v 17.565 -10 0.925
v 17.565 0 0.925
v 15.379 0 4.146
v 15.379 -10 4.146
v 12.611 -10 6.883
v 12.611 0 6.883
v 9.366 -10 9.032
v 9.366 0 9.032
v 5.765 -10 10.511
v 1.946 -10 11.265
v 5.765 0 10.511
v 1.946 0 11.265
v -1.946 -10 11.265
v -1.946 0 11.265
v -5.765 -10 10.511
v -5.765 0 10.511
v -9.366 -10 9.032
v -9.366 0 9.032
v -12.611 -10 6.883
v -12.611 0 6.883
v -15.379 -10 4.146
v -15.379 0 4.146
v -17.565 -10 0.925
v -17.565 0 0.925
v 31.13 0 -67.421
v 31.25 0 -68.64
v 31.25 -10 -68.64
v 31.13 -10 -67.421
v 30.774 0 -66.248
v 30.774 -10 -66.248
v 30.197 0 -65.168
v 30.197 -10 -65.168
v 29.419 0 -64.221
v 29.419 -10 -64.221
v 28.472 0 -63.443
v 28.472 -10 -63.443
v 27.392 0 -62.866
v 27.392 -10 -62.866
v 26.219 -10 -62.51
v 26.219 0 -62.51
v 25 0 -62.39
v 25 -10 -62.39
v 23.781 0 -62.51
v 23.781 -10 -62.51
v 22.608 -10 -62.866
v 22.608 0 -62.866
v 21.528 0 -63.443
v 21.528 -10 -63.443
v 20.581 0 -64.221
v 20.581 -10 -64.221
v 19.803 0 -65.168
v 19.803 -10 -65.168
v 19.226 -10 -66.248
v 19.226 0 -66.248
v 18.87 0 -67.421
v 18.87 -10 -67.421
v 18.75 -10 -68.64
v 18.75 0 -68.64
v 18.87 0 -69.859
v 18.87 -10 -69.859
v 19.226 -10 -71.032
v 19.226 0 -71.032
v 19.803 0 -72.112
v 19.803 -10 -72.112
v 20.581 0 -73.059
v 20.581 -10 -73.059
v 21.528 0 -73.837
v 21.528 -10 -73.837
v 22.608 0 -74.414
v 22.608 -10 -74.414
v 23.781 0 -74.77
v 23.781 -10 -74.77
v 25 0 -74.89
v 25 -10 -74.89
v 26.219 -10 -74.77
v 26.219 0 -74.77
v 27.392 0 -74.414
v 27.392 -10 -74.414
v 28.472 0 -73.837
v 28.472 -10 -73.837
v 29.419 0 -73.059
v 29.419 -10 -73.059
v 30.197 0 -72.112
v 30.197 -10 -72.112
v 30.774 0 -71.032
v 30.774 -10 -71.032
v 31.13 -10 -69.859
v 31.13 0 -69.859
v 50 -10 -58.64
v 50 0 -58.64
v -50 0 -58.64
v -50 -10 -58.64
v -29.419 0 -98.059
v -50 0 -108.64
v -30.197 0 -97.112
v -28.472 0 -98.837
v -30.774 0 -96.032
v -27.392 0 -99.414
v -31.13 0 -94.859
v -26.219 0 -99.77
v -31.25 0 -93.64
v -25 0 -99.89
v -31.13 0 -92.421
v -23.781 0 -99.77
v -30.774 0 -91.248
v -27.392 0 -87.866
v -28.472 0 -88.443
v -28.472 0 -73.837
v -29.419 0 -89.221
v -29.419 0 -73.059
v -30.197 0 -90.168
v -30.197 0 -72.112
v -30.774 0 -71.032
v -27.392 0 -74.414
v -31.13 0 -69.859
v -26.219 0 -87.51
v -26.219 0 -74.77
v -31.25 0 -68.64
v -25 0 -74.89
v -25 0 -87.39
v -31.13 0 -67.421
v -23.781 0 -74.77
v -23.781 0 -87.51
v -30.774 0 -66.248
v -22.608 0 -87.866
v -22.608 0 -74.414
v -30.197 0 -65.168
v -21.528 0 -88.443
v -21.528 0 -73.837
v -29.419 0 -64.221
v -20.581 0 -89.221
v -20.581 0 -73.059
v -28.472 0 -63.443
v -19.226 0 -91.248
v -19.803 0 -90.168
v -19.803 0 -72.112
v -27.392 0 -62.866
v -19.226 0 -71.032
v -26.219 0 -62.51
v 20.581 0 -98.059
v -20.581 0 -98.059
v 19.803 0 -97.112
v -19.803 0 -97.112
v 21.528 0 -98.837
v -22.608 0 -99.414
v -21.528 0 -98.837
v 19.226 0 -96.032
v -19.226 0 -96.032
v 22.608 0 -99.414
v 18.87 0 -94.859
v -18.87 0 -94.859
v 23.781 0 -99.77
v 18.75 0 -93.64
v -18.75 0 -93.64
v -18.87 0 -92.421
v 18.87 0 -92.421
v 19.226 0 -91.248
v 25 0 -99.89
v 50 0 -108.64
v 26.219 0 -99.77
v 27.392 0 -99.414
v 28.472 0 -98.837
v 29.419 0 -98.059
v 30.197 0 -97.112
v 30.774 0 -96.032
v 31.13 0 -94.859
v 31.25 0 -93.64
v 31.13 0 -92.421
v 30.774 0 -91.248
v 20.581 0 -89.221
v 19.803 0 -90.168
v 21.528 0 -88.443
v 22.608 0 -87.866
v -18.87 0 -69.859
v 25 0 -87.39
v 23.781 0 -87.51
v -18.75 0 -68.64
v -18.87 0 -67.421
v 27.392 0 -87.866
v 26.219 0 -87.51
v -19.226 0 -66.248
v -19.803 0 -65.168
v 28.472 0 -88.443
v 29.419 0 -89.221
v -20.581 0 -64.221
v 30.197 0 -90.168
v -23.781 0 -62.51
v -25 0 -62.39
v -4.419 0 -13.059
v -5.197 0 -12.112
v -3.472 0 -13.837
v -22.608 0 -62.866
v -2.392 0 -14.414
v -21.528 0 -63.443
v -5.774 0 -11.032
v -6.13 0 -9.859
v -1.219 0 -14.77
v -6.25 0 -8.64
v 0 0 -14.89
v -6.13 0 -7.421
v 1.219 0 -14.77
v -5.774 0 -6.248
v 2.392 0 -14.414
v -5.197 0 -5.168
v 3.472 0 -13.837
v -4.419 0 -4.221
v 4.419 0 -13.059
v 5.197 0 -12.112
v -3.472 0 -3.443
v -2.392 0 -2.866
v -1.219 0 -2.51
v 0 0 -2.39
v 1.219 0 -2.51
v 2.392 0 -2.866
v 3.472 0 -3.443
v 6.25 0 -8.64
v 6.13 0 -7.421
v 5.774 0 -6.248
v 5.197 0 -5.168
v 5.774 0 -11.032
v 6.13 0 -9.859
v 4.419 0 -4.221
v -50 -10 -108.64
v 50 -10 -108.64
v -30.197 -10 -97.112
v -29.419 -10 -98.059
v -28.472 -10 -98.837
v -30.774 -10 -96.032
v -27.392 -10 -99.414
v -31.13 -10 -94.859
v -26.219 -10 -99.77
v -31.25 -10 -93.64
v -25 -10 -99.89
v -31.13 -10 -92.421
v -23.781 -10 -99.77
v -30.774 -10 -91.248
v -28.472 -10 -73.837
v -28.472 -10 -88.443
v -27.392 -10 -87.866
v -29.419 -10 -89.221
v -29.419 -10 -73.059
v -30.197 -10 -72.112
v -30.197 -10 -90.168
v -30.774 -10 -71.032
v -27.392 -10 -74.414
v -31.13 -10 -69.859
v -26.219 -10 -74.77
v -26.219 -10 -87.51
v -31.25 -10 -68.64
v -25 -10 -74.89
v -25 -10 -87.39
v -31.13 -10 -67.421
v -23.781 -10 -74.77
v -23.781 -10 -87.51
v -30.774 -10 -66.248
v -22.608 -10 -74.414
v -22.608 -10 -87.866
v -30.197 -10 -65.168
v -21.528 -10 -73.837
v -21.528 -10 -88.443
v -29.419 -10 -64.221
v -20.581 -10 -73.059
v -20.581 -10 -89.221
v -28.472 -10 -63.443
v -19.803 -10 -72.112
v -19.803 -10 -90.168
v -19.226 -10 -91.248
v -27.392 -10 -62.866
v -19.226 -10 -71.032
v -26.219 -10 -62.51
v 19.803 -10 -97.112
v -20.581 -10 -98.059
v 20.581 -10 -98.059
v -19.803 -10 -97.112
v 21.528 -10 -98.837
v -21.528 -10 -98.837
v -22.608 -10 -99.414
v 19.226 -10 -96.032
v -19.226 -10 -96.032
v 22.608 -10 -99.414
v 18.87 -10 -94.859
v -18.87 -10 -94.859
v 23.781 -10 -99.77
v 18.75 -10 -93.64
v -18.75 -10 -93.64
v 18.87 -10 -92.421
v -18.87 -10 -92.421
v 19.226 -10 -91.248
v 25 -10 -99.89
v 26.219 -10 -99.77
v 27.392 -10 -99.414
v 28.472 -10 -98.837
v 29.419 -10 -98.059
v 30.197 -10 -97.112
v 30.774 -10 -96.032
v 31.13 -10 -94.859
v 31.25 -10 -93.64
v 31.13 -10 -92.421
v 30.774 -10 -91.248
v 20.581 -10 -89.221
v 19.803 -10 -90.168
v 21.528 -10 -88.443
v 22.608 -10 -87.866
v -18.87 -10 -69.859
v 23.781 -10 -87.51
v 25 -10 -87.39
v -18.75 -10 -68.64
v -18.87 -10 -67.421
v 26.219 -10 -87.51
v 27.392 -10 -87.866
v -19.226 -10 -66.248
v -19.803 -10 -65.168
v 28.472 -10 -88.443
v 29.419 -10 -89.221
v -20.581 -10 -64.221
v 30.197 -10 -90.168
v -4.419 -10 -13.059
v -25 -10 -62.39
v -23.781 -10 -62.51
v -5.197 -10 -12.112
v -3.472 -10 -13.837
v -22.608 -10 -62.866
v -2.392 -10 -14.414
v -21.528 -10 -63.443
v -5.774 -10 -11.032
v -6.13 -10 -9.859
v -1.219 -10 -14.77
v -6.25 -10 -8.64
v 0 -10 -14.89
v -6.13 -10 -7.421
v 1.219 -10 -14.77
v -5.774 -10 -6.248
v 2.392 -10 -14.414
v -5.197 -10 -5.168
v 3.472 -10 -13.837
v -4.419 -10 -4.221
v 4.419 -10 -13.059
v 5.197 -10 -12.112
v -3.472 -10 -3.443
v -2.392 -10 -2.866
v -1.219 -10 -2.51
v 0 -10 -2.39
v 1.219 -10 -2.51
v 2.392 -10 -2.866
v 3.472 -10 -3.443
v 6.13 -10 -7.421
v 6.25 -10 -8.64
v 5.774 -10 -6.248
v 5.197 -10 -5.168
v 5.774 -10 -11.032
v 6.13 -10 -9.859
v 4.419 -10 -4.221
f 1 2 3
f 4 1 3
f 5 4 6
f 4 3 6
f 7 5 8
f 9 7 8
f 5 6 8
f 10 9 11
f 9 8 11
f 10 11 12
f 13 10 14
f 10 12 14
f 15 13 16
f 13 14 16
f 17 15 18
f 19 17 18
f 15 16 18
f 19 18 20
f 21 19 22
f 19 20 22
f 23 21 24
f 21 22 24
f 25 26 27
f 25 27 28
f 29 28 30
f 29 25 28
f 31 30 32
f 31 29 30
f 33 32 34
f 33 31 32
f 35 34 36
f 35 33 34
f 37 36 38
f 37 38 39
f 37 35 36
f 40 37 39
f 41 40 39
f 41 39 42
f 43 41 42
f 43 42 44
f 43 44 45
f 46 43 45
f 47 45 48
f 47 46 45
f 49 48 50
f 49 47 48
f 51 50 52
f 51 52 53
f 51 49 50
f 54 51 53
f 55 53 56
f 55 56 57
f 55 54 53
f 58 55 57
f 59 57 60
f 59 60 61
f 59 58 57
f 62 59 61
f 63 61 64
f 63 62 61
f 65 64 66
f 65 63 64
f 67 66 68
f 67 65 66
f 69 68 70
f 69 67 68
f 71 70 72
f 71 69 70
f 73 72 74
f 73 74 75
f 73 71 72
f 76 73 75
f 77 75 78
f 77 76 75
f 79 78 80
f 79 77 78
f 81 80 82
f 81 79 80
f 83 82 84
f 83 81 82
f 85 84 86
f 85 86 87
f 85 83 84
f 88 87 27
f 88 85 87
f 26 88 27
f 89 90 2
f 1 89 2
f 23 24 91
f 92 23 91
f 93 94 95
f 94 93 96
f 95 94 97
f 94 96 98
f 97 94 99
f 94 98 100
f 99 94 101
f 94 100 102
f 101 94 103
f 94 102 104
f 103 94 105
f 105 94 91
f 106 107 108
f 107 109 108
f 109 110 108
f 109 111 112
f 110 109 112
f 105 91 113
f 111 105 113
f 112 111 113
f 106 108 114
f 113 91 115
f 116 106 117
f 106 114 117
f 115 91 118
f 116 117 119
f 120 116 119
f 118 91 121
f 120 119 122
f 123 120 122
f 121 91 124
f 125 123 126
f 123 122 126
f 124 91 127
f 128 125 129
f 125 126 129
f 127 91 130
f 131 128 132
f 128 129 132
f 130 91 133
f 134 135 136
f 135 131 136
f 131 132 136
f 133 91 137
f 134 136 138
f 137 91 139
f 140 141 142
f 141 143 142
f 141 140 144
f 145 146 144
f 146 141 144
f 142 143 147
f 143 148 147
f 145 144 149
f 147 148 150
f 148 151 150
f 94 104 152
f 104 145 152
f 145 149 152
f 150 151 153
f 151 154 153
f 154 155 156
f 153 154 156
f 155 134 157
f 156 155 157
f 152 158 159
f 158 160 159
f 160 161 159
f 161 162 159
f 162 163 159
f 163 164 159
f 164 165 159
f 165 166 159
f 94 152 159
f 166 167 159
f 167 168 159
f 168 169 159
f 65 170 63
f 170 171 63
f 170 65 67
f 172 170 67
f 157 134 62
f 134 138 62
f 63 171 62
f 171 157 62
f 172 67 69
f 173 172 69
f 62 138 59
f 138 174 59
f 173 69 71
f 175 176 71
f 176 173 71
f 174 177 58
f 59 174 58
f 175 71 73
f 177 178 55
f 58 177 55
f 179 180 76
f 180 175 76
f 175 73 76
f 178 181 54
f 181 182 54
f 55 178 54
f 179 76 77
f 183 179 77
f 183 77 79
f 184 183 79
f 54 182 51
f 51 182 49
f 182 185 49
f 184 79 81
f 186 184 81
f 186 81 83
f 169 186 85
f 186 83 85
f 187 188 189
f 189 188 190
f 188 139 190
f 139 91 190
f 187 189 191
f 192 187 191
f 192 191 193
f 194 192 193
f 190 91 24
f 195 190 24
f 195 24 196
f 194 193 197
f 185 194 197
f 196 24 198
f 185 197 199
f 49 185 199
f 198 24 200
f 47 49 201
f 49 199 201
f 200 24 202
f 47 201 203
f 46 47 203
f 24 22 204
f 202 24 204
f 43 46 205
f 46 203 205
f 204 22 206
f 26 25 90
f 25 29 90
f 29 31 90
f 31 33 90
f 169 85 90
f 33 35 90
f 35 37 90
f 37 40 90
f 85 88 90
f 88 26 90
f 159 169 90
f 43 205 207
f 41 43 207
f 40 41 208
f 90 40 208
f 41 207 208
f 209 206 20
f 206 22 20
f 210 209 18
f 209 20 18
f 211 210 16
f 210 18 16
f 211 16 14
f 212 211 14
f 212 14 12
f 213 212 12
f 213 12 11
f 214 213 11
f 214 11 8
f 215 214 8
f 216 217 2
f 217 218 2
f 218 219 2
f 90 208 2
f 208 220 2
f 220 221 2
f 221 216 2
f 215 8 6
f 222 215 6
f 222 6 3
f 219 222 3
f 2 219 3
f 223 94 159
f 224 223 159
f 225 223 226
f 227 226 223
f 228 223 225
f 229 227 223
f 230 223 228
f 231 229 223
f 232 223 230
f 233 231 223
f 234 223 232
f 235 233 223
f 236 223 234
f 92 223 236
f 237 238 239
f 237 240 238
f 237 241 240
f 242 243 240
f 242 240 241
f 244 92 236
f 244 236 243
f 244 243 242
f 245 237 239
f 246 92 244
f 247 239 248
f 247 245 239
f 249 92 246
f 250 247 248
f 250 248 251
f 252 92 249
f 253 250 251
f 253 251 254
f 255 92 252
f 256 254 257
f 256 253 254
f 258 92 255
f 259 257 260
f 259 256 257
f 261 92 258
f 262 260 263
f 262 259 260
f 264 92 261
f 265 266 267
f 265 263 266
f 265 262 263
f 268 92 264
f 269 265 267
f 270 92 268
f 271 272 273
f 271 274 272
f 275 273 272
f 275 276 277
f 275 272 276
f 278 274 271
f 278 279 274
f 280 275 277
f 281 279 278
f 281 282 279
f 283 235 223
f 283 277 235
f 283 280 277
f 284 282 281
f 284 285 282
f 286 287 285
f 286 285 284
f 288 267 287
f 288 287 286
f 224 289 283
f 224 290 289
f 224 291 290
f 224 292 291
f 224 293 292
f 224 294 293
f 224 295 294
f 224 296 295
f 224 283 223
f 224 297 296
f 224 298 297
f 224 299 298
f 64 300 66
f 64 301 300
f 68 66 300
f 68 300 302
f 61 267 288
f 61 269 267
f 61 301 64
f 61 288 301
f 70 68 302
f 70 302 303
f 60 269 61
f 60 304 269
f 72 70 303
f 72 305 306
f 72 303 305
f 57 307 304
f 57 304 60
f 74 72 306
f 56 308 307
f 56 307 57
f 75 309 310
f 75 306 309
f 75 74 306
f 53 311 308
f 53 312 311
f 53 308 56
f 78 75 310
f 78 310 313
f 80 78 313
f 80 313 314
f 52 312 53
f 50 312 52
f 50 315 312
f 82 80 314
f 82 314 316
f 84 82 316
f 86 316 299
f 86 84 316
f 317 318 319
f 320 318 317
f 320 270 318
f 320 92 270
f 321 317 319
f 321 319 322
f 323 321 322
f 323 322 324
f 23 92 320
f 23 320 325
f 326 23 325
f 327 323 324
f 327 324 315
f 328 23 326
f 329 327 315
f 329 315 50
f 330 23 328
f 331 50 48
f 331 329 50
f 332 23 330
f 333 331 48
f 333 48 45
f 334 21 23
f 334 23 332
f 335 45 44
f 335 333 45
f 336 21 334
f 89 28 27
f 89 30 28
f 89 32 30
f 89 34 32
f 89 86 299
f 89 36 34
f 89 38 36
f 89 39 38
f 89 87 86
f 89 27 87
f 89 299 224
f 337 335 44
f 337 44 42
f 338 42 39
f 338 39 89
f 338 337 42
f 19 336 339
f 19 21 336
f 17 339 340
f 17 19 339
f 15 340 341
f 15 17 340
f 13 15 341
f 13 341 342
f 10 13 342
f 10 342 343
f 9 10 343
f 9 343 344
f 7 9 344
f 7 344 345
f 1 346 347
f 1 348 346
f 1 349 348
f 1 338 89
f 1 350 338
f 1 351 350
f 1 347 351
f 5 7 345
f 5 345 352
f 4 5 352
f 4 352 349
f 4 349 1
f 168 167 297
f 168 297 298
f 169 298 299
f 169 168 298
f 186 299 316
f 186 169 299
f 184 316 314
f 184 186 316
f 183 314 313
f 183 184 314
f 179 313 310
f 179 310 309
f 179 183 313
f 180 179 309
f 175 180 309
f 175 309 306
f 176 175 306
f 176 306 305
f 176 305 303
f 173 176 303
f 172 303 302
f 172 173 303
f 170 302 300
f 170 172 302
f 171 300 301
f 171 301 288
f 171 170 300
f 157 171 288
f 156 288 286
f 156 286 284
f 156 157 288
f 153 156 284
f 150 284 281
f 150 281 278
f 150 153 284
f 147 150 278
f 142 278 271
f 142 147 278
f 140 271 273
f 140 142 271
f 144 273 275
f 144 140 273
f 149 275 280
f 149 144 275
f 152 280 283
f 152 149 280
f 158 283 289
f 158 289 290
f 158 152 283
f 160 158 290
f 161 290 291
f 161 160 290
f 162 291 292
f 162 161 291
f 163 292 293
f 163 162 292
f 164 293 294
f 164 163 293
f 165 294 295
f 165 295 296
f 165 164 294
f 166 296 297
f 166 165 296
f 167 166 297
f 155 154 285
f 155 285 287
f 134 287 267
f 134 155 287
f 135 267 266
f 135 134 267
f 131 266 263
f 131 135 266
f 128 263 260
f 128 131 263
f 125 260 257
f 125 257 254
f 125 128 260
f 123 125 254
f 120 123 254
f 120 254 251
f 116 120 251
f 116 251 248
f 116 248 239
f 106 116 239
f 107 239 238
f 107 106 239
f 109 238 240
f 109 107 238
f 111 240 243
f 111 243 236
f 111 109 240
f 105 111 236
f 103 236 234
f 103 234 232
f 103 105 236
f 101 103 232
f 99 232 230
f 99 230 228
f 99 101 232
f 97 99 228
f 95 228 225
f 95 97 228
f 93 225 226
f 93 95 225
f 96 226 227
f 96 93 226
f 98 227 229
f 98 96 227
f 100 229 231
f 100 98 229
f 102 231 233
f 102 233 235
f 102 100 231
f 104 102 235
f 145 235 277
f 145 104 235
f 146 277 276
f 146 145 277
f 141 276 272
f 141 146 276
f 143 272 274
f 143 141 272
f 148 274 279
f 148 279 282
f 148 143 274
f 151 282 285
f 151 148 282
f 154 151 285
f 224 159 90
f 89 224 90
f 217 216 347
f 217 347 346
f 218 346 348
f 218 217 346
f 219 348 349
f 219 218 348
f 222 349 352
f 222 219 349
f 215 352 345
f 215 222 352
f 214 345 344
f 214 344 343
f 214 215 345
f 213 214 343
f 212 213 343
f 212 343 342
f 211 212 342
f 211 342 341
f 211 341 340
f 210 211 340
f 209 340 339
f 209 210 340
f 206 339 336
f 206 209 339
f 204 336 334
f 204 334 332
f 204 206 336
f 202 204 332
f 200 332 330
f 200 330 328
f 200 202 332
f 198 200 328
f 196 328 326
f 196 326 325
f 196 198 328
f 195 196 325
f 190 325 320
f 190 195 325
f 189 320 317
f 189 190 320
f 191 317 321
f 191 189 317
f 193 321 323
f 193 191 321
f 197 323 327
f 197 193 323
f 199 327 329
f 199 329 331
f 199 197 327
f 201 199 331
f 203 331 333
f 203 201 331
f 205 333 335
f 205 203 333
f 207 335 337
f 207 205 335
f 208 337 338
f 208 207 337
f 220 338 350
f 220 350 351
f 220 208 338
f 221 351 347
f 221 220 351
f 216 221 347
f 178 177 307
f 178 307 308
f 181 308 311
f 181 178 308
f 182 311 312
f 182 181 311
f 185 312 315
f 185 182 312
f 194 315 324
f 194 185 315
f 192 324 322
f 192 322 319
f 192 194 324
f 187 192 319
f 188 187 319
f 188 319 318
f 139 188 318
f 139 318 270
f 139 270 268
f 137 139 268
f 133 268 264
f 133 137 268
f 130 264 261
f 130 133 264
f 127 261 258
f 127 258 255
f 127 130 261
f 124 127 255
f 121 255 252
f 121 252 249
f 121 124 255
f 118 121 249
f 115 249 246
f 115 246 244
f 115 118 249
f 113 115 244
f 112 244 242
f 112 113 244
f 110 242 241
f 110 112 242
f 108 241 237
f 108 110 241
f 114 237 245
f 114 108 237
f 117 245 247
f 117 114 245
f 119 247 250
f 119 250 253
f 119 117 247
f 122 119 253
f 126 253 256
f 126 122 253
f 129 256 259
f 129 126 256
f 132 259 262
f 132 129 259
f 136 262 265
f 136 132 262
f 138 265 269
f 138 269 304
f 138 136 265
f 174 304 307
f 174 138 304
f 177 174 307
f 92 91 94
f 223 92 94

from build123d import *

# Parameters (mm, degrees)
F0_R     = 6.25
F1_DEPTH = 10


with BuildPart() as f1:
    # F0 (on Front) → F1 (new body)
    with BuildSketch(Plane.XZ):
        with BuildLine():
            Line((50, -58.640056), (17.56466, 0.924604))
            ThreePointArc((17.56466, 0.924604), (0, 11.359944), (-17.56466, 0.924604))
            Line((-17.56466, 0.924604), (-50, -58.640056))
            Line((-50, -58.640056), (-50, -108.640056))
            Line((-50, -108.640056), (0, -108.640056))
            Line((0, -108.640056), (50, -108.640056))
            Line((50, -108.640056), (50, -58.640056))
        make_face()
        with Locations((-25, -93.640056)):
            Circle(F0_R, mode=Mode.SUBTRACT)
        with Locations((-25, -68.640056)):
            Circle(F0_R, mode=Mode.SUBTRACT)
        with Locations((25, -93.640056)):
            Circle(F0_R, mode=Mode.SUBTRACT)
        with Locations((25, -68.640056)):
            Circle(F0_R, mode=Mode.SUBTRACT)
        with Locations((0, -8.640056)):
            Circle(F0_R, mode=Mode.SUBTRACT)
    extrude(amount=F1_DEPTH)


solid = f1.part
